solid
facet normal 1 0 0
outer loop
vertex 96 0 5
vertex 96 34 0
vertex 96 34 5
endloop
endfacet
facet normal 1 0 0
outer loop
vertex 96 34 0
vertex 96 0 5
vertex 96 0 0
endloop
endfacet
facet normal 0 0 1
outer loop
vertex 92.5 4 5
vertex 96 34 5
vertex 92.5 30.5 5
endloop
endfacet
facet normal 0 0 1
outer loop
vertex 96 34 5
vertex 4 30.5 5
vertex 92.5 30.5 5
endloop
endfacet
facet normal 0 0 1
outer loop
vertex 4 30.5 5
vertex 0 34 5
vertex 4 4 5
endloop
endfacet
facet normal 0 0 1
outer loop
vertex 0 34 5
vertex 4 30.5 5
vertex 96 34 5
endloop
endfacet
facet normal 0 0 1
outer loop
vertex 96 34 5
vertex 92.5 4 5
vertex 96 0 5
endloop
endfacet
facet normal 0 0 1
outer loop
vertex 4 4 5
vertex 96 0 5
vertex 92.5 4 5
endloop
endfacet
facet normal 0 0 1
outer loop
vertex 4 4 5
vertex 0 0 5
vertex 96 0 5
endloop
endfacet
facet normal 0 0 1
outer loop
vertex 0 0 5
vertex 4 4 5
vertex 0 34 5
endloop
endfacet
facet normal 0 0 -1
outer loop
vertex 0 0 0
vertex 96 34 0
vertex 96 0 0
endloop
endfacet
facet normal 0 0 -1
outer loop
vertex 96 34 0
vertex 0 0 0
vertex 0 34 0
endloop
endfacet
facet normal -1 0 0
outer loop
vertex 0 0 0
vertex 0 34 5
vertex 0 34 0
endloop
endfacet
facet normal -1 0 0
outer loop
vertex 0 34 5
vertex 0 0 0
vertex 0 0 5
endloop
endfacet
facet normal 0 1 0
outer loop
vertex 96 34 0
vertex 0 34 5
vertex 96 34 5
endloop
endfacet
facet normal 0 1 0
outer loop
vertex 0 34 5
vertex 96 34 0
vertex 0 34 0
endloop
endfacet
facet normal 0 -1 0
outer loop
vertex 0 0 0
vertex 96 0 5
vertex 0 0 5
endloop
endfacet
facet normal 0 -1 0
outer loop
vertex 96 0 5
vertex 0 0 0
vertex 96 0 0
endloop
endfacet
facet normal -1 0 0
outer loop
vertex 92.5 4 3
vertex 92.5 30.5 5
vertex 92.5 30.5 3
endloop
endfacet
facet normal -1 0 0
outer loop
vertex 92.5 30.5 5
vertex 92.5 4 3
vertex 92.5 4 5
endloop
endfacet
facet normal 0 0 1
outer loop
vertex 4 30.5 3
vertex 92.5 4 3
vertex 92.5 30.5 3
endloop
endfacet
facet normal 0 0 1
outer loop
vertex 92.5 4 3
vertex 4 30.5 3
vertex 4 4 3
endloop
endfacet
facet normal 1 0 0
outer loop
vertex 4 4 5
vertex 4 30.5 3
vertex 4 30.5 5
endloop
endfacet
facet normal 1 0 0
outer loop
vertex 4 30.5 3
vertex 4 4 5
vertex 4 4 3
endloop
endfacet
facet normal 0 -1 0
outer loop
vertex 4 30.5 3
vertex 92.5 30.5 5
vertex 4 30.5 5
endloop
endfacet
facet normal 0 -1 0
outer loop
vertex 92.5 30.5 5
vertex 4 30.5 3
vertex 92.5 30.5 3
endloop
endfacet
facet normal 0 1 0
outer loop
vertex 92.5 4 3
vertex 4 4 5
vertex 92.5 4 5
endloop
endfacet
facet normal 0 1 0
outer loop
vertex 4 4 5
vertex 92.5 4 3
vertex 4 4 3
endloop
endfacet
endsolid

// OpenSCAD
//switch params
SWITCH_RAD = 8;//mm
SWITCH_HT =27;//mm
//variables
numSwitches = 4;
spaceBetweenSwitches = 6;
boxWallThickness = 5;//mm
_sideRes = 200;
//box params
BOX_LENGTH = ((SWITCH_RAD*2)+spaceBetweenSwitches)*numSwitches;
BOX_WIDTH = (SWITCH_RAD*2) + 10;
BOX_HT = SWITCH_HT+10;

//mainBox();

translate([0, 0, 0]) {
    boxStand();
}


module mainBox(){
    difference(){
         cube([BOX_LENGTH, BOX_WIDTH, BOX_HT]);

         translate([boxWallThickness/2, boxWallThickness/2, -boxWallThickness/2]) {
             cube([BOX_LENGTH-boxWallThickness, BOX_WIDTH-boxWallThickness, BOX_HT]);
         }

        translate([(SWITCH_RAD*2)-spaceBetweenSwitches+1, 0, 0]) {
            for(i=[0:numSwitches-1]){
                translate([((SWITCH_RAD*2)+spaceBetweenSwitches)*i, BOX_WIDTH/2, BOX_HT]) {
                    cylinder(r=SWITCH_RAD, h=SWITCH_HT, center=true, $fn=_sideRes);
                }
            }
        }

        //wire route
        translate([boxWallThickness,BOX_WIDTH-3,boxWallThickness]){
            cube([BOX_LENGTH-10, 5,5]);
        }

    }
   
}

module boxStand(){
    difference(){
        cube([BOX_LENGTH+8, BOX_WIDTH+8, 5]);
        translate([4, 4, 3]) {
             cube([BOX_LENGTH+.5, BOX_WIDTH+.5, 3]);
        }
       

    }
    
}
